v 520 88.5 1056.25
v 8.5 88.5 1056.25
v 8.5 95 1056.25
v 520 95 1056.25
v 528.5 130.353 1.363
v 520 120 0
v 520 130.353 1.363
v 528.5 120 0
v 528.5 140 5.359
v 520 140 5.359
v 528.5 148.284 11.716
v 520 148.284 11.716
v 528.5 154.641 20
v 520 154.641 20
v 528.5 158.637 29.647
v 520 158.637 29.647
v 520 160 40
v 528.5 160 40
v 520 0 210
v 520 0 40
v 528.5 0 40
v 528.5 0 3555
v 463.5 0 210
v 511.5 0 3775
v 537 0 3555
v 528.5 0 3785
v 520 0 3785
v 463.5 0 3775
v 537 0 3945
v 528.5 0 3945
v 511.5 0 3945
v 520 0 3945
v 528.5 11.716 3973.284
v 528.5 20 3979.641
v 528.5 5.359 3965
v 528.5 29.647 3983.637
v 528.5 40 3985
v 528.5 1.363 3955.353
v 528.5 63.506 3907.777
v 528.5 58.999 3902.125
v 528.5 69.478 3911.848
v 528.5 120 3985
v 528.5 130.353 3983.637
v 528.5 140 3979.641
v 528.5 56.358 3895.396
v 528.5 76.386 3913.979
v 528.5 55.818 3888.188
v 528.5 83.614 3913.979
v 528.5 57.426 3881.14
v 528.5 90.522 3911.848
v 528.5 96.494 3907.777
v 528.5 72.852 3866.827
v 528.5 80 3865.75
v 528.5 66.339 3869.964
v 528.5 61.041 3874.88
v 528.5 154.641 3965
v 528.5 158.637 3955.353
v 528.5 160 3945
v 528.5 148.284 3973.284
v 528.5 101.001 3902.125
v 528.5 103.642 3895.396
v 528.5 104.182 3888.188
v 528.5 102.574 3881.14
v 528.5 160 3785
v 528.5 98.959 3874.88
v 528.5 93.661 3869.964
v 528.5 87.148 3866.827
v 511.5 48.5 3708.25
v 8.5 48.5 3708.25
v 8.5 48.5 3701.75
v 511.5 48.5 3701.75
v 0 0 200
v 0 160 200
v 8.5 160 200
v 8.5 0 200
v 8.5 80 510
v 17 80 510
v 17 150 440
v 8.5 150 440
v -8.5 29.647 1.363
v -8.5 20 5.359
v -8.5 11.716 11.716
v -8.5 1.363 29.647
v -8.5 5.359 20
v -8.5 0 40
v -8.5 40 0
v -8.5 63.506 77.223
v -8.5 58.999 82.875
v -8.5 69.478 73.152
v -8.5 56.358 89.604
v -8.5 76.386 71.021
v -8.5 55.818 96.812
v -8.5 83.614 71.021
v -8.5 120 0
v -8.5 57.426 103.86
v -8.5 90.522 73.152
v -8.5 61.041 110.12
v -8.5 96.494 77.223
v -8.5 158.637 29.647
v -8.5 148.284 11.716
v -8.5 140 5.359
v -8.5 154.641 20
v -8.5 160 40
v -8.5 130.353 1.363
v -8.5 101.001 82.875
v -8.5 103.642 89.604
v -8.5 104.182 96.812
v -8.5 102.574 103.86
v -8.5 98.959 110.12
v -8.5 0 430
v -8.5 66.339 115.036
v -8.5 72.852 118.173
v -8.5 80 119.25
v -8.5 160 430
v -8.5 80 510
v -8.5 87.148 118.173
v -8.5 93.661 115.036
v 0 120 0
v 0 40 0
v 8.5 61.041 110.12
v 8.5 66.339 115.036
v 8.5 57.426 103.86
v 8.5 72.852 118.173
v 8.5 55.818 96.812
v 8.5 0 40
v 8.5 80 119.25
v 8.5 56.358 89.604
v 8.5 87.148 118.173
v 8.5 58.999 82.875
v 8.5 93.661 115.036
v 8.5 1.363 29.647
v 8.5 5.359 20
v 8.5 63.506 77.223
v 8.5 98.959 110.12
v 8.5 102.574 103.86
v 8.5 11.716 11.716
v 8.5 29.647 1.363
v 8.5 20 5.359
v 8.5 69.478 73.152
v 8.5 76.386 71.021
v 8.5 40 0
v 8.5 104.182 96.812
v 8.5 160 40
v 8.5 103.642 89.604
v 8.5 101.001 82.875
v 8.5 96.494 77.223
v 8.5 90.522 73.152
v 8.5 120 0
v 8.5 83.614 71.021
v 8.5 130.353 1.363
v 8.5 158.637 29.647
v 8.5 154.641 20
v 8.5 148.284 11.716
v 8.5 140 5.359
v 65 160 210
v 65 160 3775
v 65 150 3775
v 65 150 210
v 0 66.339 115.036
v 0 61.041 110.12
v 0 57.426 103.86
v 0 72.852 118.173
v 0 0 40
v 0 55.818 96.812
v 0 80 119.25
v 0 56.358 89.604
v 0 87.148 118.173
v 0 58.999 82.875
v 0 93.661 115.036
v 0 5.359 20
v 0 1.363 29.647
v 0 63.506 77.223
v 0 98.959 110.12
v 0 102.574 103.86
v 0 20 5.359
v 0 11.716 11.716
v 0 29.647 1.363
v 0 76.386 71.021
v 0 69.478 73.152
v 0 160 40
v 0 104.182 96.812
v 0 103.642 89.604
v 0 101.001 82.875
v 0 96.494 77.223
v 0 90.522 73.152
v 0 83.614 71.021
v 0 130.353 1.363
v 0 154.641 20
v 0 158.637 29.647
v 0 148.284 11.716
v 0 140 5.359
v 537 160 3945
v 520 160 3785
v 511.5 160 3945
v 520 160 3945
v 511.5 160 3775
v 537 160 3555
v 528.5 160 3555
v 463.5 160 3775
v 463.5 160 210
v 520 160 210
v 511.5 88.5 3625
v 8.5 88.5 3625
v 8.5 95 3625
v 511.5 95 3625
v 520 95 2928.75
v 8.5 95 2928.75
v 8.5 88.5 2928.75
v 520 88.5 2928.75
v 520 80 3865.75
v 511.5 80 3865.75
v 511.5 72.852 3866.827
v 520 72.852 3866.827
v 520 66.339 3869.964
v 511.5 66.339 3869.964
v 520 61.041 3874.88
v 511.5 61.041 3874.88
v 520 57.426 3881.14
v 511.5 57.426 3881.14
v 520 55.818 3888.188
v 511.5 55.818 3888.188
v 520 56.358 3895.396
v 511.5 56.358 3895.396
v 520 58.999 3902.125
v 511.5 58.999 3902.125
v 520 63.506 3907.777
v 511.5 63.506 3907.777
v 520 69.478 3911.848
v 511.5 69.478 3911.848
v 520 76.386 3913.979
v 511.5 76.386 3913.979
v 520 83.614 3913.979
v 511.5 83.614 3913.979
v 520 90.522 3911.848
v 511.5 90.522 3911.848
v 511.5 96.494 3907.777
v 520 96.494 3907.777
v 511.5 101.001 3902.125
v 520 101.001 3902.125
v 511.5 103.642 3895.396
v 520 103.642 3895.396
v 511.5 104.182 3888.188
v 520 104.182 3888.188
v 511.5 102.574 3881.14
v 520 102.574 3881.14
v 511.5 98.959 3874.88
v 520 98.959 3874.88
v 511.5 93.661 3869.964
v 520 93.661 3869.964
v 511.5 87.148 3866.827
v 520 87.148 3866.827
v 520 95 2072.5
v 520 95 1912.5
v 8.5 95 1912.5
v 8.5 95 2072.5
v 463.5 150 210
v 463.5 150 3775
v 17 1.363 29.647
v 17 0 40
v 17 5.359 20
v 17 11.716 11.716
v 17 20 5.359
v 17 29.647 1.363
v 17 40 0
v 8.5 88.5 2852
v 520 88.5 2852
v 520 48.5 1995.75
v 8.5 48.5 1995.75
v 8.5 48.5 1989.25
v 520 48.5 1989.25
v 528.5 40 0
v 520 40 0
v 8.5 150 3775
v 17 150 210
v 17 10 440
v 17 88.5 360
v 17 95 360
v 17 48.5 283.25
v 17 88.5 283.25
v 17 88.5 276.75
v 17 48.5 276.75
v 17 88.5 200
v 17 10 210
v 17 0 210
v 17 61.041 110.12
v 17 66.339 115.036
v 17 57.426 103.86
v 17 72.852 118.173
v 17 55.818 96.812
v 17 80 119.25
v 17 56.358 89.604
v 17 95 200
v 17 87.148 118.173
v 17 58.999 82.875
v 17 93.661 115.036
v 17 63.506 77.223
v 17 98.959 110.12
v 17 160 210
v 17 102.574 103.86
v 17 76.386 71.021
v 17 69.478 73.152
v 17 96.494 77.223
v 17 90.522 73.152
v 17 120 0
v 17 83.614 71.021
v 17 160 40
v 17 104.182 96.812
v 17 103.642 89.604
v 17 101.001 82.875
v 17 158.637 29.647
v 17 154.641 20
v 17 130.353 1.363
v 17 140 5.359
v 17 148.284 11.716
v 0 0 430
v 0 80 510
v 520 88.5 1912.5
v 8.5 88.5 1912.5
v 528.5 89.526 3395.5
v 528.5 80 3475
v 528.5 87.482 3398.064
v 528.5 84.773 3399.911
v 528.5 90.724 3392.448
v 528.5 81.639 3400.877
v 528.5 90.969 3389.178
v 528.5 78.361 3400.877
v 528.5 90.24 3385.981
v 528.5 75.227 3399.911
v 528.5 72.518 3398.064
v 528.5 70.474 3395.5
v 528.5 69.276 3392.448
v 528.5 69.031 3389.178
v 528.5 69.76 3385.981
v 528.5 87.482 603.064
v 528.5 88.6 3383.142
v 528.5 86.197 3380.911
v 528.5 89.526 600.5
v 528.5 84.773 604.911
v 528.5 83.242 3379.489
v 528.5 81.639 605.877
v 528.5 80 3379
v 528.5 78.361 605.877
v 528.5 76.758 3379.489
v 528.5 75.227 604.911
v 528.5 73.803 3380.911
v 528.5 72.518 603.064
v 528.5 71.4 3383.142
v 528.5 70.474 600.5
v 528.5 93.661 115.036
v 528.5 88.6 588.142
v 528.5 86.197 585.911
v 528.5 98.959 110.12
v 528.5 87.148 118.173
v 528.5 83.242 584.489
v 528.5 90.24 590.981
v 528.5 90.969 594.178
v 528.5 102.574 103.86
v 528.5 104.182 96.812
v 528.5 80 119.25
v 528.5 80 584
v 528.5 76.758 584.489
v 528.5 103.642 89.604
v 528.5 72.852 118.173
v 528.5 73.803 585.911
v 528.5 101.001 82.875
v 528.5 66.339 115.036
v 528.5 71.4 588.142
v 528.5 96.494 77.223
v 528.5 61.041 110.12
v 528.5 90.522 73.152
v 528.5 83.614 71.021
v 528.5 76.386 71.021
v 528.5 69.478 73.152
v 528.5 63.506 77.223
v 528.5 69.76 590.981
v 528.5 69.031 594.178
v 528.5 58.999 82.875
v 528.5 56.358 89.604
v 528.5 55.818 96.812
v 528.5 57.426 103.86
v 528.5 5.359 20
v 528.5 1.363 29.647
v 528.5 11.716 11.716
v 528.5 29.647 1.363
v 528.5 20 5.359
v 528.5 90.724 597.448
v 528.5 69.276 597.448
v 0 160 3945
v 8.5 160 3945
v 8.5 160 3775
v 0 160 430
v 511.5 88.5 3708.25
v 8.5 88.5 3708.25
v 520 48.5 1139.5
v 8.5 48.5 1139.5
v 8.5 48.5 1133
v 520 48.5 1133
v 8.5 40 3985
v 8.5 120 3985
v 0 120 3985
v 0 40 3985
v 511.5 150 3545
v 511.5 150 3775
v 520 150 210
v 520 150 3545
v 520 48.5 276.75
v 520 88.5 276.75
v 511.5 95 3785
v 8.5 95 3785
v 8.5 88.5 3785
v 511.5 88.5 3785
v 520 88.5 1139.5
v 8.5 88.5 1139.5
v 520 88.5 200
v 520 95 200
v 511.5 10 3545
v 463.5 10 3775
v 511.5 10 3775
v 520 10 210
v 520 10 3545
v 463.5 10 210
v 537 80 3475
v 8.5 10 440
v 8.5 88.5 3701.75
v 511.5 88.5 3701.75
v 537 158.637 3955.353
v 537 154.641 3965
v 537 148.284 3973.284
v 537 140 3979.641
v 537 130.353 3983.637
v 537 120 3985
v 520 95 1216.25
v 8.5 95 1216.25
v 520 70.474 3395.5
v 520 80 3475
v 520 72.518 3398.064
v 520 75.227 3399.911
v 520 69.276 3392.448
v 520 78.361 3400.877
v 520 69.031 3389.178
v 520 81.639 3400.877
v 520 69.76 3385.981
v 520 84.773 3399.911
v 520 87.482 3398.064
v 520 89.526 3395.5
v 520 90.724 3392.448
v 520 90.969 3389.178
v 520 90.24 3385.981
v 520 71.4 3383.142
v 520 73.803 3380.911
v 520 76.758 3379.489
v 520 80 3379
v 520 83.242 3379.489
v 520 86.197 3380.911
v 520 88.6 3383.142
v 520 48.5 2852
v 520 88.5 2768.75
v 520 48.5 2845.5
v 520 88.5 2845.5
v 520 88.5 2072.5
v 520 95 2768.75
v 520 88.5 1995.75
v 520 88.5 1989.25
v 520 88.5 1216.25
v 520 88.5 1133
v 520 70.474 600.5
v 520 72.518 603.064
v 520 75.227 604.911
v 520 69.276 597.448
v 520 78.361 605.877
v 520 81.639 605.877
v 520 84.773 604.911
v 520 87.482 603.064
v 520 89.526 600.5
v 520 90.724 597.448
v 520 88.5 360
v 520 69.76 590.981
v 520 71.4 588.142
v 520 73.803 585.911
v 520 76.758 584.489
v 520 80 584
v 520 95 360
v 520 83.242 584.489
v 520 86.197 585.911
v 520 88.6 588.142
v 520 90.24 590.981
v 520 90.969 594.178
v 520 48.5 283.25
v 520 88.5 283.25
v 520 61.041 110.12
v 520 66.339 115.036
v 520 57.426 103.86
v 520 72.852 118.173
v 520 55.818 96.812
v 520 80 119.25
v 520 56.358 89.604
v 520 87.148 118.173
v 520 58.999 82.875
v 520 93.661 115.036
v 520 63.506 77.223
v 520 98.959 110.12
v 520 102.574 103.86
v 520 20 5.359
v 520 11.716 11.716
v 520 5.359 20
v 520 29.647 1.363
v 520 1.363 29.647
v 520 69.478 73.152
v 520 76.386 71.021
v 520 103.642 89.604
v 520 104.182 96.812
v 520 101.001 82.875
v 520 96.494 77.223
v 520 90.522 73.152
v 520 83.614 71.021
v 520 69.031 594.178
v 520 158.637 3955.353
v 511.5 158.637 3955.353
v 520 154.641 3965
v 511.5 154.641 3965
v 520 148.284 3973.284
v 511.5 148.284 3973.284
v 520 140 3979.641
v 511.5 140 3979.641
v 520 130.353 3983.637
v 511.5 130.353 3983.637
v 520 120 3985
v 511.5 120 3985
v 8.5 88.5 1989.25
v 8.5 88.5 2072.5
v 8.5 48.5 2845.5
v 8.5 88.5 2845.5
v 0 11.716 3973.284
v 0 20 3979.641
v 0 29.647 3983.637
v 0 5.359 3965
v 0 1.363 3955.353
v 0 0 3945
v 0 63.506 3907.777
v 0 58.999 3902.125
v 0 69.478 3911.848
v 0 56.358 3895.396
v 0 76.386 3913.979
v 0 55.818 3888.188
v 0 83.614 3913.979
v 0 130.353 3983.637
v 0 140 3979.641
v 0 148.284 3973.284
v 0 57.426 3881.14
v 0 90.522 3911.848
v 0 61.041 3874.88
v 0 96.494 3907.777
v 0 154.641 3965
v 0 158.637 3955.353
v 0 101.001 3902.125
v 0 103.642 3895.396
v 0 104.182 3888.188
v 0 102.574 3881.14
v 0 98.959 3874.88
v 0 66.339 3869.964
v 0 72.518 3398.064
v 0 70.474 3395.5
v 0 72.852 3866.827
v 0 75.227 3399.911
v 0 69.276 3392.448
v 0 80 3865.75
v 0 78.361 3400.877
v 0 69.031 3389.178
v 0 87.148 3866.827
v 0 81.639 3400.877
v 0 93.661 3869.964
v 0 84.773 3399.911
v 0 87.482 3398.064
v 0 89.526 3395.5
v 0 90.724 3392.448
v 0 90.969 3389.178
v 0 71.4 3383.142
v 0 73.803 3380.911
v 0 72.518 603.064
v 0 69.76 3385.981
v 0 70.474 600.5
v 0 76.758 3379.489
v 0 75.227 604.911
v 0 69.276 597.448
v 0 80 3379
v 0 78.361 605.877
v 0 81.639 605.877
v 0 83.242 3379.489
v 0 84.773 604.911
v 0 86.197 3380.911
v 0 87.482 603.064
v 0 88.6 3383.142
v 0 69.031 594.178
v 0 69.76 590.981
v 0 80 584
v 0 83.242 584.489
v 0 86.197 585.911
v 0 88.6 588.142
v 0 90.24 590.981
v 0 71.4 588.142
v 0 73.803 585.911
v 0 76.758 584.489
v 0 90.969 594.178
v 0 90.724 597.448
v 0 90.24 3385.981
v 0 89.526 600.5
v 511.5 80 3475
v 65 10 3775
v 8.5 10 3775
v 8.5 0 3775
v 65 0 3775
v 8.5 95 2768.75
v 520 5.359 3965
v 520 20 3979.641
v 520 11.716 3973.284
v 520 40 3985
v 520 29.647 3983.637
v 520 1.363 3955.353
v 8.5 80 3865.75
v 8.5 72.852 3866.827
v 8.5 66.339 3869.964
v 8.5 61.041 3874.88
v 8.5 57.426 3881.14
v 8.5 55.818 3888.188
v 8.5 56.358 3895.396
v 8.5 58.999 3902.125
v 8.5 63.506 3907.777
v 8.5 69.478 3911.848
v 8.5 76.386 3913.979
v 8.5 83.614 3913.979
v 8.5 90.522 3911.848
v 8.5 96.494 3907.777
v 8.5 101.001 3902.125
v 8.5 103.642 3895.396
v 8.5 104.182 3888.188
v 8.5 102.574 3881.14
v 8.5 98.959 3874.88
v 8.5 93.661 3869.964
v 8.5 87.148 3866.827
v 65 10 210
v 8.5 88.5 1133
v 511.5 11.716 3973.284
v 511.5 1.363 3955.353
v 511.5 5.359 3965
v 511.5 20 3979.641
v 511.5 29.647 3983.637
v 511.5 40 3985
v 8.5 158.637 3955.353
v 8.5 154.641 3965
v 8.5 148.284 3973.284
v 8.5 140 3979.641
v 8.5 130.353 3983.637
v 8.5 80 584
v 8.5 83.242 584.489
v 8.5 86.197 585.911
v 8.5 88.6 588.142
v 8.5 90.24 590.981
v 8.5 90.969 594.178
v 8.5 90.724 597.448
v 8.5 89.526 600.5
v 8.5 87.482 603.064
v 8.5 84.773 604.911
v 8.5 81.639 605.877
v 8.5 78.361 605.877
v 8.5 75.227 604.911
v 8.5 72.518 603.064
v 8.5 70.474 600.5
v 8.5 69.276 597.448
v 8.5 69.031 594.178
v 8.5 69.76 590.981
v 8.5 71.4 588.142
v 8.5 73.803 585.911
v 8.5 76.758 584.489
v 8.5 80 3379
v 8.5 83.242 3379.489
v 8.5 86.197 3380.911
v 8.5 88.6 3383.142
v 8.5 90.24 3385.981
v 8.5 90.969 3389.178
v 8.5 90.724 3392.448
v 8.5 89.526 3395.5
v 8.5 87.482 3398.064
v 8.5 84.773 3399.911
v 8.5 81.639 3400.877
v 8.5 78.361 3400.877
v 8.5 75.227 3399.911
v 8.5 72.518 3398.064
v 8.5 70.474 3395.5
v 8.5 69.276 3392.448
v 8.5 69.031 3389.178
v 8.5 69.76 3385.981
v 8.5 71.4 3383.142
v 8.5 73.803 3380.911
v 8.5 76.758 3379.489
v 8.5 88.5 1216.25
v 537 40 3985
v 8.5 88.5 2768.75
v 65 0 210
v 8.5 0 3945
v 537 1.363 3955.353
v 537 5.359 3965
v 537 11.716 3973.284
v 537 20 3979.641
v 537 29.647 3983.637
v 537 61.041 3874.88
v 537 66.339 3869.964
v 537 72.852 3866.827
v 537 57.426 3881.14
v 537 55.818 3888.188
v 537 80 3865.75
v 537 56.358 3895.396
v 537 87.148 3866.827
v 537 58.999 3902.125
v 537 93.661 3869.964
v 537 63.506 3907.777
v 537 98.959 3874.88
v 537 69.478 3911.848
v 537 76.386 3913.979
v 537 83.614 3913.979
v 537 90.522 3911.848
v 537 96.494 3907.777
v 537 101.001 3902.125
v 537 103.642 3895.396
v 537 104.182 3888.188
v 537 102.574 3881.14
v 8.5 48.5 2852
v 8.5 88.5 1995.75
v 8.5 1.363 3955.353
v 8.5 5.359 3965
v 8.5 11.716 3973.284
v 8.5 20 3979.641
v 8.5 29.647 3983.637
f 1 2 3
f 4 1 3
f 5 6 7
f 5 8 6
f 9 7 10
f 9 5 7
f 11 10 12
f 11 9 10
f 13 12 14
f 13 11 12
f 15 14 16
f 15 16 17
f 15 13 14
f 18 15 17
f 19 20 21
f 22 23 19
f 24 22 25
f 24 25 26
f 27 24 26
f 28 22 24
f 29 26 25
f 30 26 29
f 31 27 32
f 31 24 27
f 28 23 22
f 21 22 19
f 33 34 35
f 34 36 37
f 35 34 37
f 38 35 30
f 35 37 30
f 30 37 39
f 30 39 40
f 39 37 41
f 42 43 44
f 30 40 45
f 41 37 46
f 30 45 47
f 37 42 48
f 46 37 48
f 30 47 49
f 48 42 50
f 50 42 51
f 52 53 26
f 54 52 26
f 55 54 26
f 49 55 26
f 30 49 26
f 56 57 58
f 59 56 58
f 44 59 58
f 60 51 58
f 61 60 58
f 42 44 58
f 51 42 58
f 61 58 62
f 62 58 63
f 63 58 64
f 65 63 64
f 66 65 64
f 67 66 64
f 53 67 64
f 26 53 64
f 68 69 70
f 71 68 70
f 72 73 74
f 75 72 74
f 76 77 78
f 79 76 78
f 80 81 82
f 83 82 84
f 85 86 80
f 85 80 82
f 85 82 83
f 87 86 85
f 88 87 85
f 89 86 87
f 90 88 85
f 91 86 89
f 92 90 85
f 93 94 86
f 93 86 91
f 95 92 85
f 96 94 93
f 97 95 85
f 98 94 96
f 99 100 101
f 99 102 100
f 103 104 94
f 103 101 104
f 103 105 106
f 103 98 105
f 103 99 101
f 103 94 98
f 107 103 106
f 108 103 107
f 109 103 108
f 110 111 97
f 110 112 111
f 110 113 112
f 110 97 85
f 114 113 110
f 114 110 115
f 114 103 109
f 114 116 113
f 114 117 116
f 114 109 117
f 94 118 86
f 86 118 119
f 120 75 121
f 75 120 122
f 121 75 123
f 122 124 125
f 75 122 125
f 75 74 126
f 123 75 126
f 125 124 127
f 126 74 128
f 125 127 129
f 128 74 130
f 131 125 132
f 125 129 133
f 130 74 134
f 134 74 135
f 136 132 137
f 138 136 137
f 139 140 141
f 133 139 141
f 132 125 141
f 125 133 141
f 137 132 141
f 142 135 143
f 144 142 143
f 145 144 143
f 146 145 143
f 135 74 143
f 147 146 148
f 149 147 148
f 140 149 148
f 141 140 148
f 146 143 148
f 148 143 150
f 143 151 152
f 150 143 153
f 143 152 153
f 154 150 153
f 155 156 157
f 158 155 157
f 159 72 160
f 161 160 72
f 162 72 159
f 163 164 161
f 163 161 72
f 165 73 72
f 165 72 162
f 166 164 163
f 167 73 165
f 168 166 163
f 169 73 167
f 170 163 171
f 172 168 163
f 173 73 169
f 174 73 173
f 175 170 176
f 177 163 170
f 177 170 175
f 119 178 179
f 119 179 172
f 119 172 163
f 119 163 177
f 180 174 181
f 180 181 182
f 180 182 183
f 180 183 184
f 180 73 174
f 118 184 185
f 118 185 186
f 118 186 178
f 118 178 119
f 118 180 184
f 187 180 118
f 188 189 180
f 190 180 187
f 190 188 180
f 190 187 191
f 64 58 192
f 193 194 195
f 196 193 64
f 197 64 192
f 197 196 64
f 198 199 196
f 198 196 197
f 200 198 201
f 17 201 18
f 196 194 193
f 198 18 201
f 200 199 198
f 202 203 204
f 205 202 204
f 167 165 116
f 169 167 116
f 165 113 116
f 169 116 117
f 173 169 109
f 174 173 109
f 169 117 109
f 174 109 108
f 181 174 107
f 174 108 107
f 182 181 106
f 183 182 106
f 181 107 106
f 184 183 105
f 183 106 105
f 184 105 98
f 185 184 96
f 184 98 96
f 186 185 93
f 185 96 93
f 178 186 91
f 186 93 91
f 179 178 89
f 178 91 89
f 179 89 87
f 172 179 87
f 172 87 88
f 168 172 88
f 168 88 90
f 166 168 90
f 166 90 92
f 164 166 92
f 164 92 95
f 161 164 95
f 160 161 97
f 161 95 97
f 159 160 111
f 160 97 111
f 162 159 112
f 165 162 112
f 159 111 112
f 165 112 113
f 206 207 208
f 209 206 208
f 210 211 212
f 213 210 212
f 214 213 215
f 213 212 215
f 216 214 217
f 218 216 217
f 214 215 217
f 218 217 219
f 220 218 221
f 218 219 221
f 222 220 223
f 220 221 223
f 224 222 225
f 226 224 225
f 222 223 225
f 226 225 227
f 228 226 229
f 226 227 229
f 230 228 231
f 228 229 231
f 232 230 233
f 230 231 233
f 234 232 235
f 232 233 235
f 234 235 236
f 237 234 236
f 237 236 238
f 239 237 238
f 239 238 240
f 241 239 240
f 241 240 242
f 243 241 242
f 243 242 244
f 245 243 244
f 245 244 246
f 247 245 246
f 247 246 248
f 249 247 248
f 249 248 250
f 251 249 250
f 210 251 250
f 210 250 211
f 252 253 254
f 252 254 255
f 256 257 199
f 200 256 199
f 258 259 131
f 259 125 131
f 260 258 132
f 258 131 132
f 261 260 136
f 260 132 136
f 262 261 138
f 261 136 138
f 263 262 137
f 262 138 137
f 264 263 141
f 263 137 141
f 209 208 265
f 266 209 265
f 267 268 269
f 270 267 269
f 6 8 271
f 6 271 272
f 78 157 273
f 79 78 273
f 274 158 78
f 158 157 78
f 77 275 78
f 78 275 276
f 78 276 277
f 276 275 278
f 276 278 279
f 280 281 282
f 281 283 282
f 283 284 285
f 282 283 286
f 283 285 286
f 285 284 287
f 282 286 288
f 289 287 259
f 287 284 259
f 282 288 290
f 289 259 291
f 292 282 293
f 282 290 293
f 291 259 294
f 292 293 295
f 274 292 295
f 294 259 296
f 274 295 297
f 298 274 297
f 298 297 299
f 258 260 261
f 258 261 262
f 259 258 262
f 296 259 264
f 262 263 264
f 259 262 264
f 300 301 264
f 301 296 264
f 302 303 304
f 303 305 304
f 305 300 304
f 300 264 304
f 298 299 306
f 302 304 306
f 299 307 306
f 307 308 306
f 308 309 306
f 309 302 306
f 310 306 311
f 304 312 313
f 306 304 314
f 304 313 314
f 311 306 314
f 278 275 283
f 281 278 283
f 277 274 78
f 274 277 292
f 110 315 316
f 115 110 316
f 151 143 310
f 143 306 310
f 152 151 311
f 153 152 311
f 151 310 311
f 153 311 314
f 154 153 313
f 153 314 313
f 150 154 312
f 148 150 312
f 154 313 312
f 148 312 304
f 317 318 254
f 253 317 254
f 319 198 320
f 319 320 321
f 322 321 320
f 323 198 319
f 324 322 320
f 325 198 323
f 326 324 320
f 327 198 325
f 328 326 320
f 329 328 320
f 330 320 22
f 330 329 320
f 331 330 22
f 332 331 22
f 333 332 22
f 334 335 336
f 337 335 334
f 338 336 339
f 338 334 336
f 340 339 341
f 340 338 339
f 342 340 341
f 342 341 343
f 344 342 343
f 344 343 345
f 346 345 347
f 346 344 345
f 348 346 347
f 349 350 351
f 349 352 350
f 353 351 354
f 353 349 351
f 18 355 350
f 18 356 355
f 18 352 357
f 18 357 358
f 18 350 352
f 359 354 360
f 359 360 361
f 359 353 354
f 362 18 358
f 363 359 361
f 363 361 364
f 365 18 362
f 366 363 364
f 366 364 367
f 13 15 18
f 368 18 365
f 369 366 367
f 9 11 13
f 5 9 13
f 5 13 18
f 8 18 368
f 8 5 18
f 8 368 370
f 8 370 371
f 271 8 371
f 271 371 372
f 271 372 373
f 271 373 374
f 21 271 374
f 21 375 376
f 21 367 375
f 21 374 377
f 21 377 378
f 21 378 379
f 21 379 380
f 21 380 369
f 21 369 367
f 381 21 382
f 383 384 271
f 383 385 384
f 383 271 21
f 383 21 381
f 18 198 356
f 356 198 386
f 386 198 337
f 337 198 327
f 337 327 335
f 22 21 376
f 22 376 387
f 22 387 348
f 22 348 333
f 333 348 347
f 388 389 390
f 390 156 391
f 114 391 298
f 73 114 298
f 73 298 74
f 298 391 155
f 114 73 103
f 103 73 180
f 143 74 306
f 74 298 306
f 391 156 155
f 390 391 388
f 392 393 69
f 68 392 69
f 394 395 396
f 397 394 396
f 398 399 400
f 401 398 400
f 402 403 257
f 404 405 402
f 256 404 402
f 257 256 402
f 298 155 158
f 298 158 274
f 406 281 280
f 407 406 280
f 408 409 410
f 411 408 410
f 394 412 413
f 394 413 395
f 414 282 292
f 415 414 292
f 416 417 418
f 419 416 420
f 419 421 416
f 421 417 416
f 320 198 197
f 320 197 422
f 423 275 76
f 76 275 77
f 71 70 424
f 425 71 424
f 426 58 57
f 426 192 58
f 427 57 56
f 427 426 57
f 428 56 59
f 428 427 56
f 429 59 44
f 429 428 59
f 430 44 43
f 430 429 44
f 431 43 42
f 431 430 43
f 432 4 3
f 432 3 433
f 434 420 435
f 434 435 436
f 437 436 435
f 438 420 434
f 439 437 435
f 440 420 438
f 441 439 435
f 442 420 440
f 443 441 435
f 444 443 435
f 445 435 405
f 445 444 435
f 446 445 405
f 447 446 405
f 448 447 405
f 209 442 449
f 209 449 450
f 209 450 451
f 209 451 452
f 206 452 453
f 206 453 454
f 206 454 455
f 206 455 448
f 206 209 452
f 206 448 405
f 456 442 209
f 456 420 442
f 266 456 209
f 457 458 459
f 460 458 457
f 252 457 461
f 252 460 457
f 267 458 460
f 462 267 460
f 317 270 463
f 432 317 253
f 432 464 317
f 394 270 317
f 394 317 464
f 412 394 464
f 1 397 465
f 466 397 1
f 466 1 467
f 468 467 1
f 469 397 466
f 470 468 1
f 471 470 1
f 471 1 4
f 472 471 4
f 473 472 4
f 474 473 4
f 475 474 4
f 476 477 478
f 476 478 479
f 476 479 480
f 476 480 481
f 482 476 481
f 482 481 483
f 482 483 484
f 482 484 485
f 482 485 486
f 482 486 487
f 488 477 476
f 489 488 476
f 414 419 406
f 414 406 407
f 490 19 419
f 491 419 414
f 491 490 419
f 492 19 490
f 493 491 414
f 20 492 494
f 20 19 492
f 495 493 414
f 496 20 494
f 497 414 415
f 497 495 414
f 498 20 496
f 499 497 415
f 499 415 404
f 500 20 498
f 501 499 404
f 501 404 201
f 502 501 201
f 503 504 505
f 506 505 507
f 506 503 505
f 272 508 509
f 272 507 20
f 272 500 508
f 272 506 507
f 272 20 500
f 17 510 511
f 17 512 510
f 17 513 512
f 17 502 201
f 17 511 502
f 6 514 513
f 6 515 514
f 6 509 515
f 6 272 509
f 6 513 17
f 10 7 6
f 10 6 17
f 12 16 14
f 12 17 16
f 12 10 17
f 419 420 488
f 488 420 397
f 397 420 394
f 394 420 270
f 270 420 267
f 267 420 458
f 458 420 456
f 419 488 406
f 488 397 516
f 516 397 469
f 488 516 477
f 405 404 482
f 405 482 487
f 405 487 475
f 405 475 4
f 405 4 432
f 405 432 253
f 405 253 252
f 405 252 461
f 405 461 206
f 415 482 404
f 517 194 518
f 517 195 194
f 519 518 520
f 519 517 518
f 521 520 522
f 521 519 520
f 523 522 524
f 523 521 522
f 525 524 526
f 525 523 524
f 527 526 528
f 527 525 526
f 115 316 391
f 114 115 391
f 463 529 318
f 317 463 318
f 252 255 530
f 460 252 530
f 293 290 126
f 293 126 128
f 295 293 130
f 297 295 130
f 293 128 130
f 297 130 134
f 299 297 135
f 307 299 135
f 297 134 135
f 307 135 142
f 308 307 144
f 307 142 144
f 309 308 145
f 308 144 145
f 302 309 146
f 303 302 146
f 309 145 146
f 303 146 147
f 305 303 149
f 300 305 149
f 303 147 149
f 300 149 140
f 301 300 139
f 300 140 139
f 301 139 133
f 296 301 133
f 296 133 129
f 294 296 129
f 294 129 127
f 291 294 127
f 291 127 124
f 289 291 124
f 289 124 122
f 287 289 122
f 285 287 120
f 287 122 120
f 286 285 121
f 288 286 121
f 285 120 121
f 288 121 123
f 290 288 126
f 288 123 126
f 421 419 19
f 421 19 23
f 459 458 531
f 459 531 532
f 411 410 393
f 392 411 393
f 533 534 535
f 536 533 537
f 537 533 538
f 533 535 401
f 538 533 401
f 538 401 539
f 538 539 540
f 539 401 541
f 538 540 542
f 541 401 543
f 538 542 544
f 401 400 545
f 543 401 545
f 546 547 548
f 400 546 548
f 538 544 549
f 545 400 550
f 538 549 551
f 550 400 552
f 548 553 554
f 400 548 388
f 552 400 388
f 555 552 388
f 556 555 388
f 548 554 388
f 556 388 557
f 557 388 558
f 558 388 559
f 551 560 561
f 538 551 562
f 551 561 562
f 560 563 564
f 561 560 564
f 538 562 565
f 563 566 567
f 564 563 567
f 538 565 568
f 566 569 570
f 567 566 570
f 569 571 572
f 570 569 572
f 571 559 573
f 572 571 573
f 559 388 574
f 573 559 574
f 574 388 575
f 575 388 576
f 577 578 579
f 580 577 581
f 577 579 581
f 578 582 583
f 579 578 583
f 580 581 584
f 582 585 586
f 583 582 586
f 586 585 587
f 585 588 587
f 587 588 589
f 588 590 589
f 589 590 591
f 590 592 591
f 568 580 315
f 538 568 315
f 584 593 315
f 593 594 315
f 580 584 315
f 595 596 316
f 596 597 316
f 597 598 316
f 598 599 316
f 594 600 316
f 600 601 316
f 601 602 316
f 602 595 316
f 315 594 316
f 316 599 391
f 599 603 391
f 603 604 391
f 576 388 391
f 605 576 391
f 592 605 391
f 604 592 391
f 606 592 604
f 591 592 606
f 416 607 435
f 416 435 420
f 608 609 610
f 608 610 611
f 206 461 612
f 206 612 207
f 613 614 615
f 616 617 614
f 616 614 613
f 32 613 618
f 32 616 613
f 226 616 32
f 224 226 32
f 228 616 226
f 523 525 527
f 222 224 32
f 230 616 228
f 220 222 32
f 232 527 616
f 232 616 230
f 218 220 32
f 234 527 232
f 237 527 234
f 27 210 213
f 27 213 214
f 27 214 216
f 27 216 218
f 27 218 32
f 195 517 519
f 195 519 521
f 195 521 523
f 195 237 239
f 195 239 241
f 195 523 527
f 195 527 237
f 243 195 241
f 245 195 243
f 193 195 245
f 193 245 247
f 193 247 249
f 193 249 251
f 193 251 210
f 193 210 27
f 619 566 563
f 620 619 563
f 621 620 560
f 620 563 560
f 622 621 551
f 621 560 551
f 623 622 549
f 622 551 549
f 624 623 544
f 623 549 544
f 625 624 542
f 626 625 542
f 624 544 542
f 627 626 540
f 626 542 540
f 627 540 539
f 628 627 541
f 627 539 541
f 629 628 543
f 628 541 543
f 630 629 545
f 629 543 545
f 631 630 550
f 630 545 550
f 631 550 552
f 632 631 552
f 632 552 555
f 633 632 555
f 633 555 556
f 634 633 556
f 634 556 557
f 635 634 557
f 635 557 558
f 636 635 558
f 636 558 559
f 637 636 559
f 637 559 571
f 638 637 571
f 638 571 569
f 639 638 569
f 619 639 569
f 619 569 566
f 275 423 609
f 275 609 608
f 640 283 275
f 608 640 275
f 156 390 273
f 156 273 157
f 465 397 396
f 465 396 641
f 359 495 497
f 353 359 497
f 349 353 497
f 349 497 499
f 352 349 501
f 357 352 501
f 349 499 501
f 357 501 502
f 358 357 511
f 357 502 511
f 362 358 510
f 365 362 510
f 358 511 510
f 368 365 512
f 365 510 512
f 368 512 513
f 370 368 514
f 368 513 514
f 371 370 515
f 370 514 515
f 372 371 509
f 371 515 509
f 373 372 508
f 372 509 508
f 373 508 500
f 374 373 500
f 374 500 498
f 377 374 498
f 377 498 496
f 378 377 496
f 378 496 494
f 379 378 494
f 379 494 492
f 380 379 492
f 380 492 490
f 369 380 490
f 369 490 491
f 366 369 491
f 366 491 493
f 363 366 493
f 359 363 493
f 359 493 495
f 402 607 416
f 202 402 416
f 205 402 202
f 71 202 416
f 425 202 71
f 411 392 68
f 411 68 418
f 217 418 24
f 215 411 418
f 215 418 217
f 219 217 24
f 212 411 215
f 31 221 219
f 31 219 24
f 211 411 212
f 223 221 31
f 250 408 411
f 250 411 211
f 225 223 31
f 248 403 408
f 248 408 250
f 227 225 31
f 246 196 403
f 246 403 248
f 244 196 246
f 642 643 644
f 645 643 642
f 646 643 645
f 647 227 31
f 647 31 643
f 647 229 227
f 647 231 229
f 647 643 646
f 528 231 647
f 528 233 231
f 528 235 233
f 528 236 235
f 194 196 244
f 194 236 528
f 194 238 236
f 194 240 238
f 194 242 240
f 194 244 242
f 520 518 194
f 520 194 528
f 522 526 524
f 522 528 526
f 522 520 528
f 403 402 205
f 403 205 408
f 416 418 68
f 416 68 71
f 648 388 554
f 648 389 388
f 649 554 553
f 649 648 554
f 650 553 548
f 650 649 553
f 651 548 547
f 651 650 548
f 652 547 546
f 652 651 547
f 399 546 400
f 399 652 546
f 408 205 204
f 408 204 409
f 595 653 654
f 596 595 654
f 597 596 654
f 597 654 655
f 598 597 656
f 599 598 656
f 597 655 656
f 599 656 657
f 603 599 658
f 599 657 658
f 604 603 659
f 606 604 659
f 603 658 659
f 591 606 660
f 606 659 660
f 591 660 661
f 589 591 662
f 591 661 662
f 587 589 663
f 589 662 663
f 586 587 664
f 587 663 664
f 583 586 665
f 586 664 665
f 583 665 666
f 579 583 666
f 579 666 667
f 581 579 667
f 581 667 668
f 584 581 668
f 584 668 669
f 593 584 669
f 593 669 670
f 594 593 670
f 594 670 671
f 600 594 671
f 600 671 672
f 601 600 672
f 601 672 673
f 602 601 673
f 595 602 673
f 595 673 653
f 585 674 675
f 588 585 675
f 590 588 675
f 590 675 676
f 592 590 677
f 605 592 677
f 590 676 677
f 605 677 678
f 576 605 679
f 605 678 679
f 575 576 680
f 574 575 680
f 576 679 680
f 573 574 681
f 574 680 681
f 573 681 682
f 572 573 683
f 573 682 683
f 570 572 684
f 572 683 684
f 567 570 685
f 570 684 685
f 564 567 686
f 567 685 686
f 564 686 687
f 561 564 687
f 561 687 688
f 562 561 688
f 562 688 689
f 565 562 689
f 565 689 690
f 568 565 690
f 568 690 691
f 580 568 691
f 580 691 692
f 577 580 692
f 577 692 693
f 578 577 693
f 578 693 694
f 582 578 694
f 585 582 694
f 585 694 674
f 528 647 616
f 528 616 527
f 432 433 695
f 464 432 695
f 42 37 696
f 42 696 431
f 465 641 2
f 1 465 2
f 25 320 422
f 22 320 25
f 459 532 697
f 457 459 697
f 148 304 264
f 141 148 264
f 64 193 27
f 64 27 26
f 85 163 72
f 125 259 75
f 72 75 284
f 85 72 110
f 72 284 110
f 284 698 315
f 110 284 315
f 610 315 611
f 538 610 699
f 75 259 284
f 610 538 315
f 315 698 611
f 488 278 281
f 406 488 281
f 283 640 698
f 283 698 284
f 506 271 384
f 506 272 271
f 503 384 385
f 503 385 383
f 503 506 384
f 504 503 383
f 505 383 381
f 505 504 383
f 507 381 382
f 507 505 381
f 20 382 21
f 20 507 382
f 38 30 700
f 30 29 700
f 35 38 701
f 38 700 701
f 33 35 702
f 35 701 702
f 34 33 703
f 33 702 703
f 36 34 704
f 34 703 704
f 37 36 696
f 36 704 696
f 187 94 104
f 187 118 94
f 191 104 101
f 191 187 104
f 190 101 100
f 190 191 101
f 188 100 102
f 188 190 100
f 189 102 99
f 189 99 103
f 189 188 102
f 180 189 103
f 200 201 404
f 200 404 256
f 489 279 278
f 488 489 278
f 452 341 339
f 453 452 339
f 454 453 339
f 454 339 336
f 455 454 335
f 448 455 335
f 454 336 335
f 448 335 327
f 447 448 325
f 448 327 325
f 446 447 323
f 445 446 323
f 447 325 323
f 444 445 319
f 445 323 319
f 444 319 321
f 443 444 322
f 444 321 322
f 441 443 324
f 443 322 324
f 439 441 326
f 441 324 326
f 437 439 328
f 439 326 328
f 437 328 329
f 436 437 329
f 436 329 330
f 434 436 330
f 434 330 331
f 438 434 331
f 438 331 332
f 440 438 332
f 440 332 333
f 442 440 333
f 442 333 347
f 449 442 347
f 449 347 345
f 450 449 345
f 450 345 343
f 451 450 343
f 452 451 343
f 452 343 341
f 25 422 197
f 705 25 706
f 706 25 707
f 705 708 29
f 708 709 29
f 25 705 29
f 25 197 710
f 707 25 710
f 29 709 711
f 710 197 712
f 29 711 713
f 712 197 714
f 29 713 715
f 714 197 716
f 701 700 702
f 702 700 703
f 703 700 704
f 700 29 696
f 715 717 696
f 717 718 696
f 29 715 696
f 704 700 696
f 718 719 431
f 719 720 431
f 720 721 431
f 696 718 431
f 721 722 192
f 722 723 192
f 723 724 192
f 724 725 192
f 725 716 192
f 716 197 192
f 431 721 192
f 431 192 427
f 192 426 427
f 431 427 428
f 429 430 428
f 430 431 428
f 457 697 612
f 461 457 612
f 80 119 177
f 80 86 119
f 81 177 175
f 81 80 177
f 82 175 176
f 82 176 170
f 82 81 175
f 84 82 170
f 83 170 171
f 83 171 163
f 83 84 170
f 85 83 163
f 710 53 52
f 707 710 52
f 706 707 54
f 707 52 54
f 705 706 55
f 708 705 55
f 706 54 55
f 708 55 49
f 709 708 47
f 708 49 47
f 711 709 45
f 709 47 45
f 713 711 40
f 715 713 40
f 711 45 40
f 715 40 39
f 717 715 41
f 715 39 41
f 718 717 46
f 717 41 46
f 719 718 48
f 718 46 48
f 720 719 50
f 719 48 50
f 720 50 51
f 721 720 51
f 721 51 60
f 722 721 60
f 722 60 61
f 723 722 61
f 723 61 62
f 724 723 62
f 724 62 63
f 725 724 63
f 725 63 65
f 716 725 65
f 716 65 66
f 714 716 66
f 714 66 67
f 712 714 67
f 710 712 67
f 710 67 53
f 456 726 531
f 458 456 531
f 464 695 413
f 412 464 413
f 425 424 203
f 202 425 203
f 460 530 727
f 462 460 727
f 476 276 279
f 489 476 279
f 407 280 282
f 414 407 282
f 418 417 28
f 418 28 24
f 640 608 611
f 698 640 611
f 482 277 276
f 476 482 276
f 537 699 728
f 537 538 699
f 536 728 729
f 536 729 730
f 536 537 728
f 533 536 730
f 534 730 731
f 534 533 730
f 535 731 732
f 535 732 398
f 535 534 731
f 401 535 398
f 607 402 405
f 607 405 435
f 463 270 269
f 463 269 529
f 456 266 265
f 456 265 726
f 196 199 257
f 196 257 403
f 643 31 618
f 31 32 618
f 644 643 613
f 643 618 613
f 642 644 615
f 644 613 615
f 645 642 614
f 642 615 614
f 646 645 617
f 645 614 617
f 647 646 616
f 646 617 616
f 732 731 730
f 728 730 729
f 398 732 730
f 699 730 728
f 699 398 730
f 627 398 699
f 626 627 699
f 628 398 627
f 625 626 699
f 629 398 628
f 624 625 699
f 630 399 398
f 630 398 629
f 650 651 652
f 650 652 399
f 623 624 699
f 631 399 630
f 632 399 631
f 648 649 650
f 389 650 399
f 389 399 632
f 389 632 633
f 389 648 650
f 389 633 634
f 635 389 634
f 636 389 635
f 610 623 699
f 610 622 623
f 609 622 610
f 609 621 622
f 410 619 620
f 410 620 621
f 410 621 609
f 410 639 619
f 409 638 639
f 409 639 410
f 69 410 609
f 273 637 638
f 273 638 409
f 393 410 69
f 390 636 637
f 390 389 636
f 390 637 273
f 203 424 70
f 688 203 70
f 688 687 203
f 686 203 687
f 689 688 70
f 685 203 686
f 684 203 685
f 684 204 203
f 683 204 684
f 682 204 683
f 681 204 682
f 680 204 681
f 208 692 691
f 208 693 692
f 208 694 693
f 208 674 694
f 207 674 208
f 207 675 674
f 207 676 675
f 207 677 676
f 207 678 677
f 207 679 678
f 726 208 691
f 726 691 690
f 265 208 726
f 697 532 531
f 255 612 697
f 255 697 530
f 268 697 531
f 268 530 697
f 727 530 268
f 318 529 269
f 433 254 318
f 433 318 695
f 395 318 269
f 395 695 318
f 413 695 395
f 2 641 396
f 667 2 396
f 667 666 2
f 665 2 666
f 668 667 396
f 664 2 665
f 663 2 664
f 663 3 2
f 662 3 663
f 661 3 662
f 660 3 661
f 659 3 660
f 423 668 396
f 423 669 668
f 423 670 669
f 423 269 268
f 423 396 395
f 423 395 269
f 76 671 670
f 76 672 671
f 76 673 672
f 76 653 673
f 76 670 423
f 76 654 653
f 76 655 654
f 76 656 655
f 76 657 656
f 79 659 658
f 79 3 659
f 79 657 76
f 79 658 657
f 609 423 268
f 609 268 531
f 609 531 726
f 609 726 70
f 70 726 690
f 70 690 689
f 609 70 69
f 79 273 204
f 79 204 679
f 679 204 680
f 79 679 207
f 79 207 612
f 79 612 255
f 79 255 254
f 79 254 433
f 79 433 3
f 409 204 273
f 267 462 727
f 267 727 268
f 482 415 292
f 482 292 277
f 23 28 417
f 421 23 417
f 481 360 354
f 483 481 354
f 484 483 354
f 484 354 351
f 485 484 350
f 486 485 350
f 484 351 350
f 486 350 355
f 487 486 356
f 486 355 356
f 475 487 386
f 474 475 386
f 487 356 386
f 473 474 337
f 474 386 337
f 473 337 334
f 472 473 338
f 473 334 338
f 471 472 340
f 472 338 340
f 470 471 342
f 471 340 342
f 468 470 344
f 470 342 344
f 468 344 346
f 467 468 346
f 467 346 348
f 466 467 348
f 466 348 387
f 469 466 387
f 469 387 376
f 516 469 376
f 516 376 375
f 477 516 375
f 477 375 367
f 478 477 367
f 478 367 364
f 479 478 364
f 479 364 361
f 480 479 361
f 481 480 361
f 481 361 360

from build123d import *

# Parameters (mm, degrees)
EXTRUDE_1_DEPTH        = 3985
EXTRUDE_1_2_DEPTH      = 3985
EXTRUDE_3_DEPTH        = 520
SKETCH_6_W             = 511.5
SKETCH_6_H             = 200
CUT_EXTRUDE_4_DEPTH    = 4024.075595859
PATTERN_LINEAR_1_COUNT = 5
PATTERN_LINEAR_1_PITCH = 856.25
EXTRUDE_11_DEPTH       = 8.5
PATTERN_LINEAR_2_COUNT = 2
PATTERN_LINEAR_2_PITCH = 17
SKETCH_22_W            = 8.5
SKETCH_22_H            = 200
CUT_EXTRUDE_12_DEPTH   = 4025.201038716
SKETCH_23_R            = 24.25
CUT_EXTRUDE_13_DEPTH   = 4025.201038716
EXTRUDE_14_DEPTH       = 8.5
PATTERN_LINEAR_3_COUNT = 2
PATTERN_LINEAR_3_PITCH = 17
SKETCH_27_W            = 8.5
SKETCH_27_H            = 200
CUT_EXTRUDE_15_DEPTH   = 4025.201038716
SKETCH_28_R            = 24.25
CUT_EXTRUDE_16_DEPTH   = 4026.344115725
FILLET_2_R             = 40
SKETCH_29_W            = 503
SKETCH_29_H            = 10
CUT_EXTRUDE_17_DEPTH   = 10
SKETCH_30_W            = 503
SKETCH_30_H            = 10
CUT_EXTRUDE_18_DEPTH   = 10
SKETCH_31_R            = 11
CUT_EXTRUDE_19_DEPTH   = 4025.201038716


with BuildPart() as part:
    # 草图2 → 拉伸1 (new body)
    with BuildSketch(Plane.XY):
        Polygon((0, 0), (0, 160), (65, 160), (65, 150), (8.5, 150), (8.5, 10), (65, 10), (65, 0), align=None)
    extrude(amount=EXTRUDE_1_DEPTH)



with BuildPart() as body_2:
    # 草图2 → Extrude 1 2 (new body)
    with BuildSketch(Plane.XY):
        Polygon((463.5, 160), (528.5, 160), (528.5, 0), (463.5, 0), (463.5, 10), (520, 10), (520, 150), (463.5, 150), align=None)
    extrude(amount=EXTRUDE_1_2_DEPTH)


with BuildPart() as part_1:
    add(part.part)

    add(body_2.part)  # 拉伸3 merges body 2
    # 草图5 → 拉伸3 (add)
    with BuildSketch(Plane.ZY):
        Polygon((200, 95), (360, 95), (360, 88.5), (283.25, 88.5), (283.25, 48.5), (276.75, 48.5), (276.75, 88.5), (200, 88.5), align=None)
    extrude_3 = extrude(amount=-EXTRUDE_3_DEPTH)

    # 草图6 → 拉伸4 (cut, through all)
    with BuildSketch(Plane(origin=(0, 160, 0), x_dir=(1, 0, 0), z_dir=(0, 1, 0))):
        with Locations((264.25, -100)):
            Rectangle(SKETCH_6_W, SKETCH_6_H)
        with Locations((264.25, -3885)):
            Rectangle(SKETCH_6_W, SKETCH_6_H)
    extrude(amount=-CUT_EXTRUDE_4_DEPTH, mode=Mode.SUBTRACT)

    # 阵列(线性)1: 拉伸3 ×5
    with Locations(*[(0, 0, i * PATTERN_LINEAR_1_PITCH) for i in range(1, PATTERN_LINEAR_1_COUNT)]):
        add(extrude_3)

    # 草图19 → 拉伸11 (add)
    with BuildSketch(Plane(origin=(528.5, 0, 0), x_dir=(0, 0, -1), z_dir=(1, 0, 0))):
        Polygon((-3985, 160), (-3555, 160), (-3475, 80), (-3555, 0), (-3985, 0), align=None)
    extrude_11 = extrude(amount=EXTRUDE_11_DEPTH)

    # 阵列(线性)2: 拉伸11 ×2
    with Locations(*[(-i * PATTERN_LINEAR_2_PITCH, 0, 0) for i in range(1, PATTERN_LINEAR_2_COUNT)]):
        add(extrude_11)

    # 草图22 → 拉伸12 (cut, through all)
    with BuildSketch(Plane(origin=(0, 160, 0), x_dir=(1, 0, 0), z_dir=(0, 1, 0))):
        with Locations((524.25, -3885)):
            Rectangle(SKETCH_22_W, SKETCH_22_H)
    extrude(amount=-CUT_EXTRUDE_12_DEPTH, mode=Mode.SUBTRACT)

    # 草图23 → 拉伸13 (cut, through all)
    with BuildSketch(Plane.ZY):
        with Locations((95, 80)):
            Circle(SKETCH_23_R)
        with Locations(Location((3890, 80, 0), (0, 0, 180))):
            Circle(SKETCH_23_R)
    extrude(amount=-CUT_EXTRUDE_13_DEPTH, mode=Mode.SUBTRACT)

    # 草图26 → 拉伸14 (add)
    with BuildSketch(Plane.ZY):
        Polygon((0, 160), (0, 0), (430, 0), (510, 80), (430, 160), align=None)
    extrude_14 = extrude(amount=EXTRUDE_14_DEPTH)

    # 阵列(线性)3: 拉伸14 ×2
    with Locations(*[(i * PATTERN_LINEAR_3_PITCH, 0, 0) for i in range(1, PATTERN_LINEAR_3_COUNT)]):
        add(extrude_14)

    # 草图27 → 拉伸15 (cut, through all)
    with BuildSketch(Plane(origin=(0, 160, 0), x_dir=(1, 0, 0), z_dir=(0, 1, 0))):
        with Locations((4.25, -100)):
            Rectangle(SKETCH_27_W, SKETCH_27_H)
    extrude(amount=-CUT_EXTRUDE_15_DEPTH, mode=Mode.SUBTRACT)

    # 草图28 → 拉伸16 (cut, through all)
    with BuildSketch(Plane.ZY.offset(8.5)):
        with Locations((95, 80)):
            Circle(SKETCH_28_R)
    extrude(amount=-CUT_EXTRUDE_16_DEPTH, mode=Mode.SUBTRACT)

    # 圆角2
    fillet_2_edges = [part_1.edges().sort_by_distance(p)[0] for p in [
        (-4.25, 0, 0),
        (515.75, 0, 3985),
        (4.25, 160, 3985),
        (515.75, 160, 3985),
        (532.75, 0, 3985),
        (4.25, 0, 3985),
        (-4.25, 160, 0),
        (12.75, 0, 0),
        (524.25, 160, 0),
        (532.75, 160, 3985),
        (524.25, 0, 0),
        (12.75, 160, 0),
    ]]
    fillet(fillet_2_edges, radius=FILLET_2_R)

    # 草图29 → 拉伸17 (cut)
    with BuildSketch(Plane.XY.offset(3785)):
        with Locations((260, 155)):
            Rectangle(SKETCH_29_W, SKETCH_29_H)
        with Locations((260, 5)):
            Rectangle(SKETCH_29_W, SKETCH_29_H)
    extrude(amount=-CUT_EXTRUDE_17_DEPTH, mode=Mode.SUBTRACT)

    # 草图30 → 拉伸18 (cut)
    with BuildSketch(Plane(origin=(0, 0, 200), x_dir=(-1, 0, 0), z_dir=(0, 0, -1))):
        with Locations((-268.5, 155)):
            Rectangle(SKETCH_30_W, SKETCH_30_H)
        with Locations((-268.5, 5)):
            Rectangle(SKETCH_30_W, SKETCH_30_H)
    extrude(amount=-CUT_EXTRUDE_18_DEPTH, mode=Mode.SUBTRACT)

    # 草图31 → 拉伸19 (cut, through all)
    with BuildSketch(Plane(origin=(528.5, 0, 0), x_dir=(0, 0, -1), z_dir=(1, 0, 0))):
        with Locations((-595, 80)):
            Circle(SKETCH_31_R)
        with Locations((-3390, 80)):
            Circle(SKETCH_31_R)
    extrude(amount=-CUT_EXTRUDE_19_DEPTH, mode=Mode.SUBTRACT)


solid = part_1.part
